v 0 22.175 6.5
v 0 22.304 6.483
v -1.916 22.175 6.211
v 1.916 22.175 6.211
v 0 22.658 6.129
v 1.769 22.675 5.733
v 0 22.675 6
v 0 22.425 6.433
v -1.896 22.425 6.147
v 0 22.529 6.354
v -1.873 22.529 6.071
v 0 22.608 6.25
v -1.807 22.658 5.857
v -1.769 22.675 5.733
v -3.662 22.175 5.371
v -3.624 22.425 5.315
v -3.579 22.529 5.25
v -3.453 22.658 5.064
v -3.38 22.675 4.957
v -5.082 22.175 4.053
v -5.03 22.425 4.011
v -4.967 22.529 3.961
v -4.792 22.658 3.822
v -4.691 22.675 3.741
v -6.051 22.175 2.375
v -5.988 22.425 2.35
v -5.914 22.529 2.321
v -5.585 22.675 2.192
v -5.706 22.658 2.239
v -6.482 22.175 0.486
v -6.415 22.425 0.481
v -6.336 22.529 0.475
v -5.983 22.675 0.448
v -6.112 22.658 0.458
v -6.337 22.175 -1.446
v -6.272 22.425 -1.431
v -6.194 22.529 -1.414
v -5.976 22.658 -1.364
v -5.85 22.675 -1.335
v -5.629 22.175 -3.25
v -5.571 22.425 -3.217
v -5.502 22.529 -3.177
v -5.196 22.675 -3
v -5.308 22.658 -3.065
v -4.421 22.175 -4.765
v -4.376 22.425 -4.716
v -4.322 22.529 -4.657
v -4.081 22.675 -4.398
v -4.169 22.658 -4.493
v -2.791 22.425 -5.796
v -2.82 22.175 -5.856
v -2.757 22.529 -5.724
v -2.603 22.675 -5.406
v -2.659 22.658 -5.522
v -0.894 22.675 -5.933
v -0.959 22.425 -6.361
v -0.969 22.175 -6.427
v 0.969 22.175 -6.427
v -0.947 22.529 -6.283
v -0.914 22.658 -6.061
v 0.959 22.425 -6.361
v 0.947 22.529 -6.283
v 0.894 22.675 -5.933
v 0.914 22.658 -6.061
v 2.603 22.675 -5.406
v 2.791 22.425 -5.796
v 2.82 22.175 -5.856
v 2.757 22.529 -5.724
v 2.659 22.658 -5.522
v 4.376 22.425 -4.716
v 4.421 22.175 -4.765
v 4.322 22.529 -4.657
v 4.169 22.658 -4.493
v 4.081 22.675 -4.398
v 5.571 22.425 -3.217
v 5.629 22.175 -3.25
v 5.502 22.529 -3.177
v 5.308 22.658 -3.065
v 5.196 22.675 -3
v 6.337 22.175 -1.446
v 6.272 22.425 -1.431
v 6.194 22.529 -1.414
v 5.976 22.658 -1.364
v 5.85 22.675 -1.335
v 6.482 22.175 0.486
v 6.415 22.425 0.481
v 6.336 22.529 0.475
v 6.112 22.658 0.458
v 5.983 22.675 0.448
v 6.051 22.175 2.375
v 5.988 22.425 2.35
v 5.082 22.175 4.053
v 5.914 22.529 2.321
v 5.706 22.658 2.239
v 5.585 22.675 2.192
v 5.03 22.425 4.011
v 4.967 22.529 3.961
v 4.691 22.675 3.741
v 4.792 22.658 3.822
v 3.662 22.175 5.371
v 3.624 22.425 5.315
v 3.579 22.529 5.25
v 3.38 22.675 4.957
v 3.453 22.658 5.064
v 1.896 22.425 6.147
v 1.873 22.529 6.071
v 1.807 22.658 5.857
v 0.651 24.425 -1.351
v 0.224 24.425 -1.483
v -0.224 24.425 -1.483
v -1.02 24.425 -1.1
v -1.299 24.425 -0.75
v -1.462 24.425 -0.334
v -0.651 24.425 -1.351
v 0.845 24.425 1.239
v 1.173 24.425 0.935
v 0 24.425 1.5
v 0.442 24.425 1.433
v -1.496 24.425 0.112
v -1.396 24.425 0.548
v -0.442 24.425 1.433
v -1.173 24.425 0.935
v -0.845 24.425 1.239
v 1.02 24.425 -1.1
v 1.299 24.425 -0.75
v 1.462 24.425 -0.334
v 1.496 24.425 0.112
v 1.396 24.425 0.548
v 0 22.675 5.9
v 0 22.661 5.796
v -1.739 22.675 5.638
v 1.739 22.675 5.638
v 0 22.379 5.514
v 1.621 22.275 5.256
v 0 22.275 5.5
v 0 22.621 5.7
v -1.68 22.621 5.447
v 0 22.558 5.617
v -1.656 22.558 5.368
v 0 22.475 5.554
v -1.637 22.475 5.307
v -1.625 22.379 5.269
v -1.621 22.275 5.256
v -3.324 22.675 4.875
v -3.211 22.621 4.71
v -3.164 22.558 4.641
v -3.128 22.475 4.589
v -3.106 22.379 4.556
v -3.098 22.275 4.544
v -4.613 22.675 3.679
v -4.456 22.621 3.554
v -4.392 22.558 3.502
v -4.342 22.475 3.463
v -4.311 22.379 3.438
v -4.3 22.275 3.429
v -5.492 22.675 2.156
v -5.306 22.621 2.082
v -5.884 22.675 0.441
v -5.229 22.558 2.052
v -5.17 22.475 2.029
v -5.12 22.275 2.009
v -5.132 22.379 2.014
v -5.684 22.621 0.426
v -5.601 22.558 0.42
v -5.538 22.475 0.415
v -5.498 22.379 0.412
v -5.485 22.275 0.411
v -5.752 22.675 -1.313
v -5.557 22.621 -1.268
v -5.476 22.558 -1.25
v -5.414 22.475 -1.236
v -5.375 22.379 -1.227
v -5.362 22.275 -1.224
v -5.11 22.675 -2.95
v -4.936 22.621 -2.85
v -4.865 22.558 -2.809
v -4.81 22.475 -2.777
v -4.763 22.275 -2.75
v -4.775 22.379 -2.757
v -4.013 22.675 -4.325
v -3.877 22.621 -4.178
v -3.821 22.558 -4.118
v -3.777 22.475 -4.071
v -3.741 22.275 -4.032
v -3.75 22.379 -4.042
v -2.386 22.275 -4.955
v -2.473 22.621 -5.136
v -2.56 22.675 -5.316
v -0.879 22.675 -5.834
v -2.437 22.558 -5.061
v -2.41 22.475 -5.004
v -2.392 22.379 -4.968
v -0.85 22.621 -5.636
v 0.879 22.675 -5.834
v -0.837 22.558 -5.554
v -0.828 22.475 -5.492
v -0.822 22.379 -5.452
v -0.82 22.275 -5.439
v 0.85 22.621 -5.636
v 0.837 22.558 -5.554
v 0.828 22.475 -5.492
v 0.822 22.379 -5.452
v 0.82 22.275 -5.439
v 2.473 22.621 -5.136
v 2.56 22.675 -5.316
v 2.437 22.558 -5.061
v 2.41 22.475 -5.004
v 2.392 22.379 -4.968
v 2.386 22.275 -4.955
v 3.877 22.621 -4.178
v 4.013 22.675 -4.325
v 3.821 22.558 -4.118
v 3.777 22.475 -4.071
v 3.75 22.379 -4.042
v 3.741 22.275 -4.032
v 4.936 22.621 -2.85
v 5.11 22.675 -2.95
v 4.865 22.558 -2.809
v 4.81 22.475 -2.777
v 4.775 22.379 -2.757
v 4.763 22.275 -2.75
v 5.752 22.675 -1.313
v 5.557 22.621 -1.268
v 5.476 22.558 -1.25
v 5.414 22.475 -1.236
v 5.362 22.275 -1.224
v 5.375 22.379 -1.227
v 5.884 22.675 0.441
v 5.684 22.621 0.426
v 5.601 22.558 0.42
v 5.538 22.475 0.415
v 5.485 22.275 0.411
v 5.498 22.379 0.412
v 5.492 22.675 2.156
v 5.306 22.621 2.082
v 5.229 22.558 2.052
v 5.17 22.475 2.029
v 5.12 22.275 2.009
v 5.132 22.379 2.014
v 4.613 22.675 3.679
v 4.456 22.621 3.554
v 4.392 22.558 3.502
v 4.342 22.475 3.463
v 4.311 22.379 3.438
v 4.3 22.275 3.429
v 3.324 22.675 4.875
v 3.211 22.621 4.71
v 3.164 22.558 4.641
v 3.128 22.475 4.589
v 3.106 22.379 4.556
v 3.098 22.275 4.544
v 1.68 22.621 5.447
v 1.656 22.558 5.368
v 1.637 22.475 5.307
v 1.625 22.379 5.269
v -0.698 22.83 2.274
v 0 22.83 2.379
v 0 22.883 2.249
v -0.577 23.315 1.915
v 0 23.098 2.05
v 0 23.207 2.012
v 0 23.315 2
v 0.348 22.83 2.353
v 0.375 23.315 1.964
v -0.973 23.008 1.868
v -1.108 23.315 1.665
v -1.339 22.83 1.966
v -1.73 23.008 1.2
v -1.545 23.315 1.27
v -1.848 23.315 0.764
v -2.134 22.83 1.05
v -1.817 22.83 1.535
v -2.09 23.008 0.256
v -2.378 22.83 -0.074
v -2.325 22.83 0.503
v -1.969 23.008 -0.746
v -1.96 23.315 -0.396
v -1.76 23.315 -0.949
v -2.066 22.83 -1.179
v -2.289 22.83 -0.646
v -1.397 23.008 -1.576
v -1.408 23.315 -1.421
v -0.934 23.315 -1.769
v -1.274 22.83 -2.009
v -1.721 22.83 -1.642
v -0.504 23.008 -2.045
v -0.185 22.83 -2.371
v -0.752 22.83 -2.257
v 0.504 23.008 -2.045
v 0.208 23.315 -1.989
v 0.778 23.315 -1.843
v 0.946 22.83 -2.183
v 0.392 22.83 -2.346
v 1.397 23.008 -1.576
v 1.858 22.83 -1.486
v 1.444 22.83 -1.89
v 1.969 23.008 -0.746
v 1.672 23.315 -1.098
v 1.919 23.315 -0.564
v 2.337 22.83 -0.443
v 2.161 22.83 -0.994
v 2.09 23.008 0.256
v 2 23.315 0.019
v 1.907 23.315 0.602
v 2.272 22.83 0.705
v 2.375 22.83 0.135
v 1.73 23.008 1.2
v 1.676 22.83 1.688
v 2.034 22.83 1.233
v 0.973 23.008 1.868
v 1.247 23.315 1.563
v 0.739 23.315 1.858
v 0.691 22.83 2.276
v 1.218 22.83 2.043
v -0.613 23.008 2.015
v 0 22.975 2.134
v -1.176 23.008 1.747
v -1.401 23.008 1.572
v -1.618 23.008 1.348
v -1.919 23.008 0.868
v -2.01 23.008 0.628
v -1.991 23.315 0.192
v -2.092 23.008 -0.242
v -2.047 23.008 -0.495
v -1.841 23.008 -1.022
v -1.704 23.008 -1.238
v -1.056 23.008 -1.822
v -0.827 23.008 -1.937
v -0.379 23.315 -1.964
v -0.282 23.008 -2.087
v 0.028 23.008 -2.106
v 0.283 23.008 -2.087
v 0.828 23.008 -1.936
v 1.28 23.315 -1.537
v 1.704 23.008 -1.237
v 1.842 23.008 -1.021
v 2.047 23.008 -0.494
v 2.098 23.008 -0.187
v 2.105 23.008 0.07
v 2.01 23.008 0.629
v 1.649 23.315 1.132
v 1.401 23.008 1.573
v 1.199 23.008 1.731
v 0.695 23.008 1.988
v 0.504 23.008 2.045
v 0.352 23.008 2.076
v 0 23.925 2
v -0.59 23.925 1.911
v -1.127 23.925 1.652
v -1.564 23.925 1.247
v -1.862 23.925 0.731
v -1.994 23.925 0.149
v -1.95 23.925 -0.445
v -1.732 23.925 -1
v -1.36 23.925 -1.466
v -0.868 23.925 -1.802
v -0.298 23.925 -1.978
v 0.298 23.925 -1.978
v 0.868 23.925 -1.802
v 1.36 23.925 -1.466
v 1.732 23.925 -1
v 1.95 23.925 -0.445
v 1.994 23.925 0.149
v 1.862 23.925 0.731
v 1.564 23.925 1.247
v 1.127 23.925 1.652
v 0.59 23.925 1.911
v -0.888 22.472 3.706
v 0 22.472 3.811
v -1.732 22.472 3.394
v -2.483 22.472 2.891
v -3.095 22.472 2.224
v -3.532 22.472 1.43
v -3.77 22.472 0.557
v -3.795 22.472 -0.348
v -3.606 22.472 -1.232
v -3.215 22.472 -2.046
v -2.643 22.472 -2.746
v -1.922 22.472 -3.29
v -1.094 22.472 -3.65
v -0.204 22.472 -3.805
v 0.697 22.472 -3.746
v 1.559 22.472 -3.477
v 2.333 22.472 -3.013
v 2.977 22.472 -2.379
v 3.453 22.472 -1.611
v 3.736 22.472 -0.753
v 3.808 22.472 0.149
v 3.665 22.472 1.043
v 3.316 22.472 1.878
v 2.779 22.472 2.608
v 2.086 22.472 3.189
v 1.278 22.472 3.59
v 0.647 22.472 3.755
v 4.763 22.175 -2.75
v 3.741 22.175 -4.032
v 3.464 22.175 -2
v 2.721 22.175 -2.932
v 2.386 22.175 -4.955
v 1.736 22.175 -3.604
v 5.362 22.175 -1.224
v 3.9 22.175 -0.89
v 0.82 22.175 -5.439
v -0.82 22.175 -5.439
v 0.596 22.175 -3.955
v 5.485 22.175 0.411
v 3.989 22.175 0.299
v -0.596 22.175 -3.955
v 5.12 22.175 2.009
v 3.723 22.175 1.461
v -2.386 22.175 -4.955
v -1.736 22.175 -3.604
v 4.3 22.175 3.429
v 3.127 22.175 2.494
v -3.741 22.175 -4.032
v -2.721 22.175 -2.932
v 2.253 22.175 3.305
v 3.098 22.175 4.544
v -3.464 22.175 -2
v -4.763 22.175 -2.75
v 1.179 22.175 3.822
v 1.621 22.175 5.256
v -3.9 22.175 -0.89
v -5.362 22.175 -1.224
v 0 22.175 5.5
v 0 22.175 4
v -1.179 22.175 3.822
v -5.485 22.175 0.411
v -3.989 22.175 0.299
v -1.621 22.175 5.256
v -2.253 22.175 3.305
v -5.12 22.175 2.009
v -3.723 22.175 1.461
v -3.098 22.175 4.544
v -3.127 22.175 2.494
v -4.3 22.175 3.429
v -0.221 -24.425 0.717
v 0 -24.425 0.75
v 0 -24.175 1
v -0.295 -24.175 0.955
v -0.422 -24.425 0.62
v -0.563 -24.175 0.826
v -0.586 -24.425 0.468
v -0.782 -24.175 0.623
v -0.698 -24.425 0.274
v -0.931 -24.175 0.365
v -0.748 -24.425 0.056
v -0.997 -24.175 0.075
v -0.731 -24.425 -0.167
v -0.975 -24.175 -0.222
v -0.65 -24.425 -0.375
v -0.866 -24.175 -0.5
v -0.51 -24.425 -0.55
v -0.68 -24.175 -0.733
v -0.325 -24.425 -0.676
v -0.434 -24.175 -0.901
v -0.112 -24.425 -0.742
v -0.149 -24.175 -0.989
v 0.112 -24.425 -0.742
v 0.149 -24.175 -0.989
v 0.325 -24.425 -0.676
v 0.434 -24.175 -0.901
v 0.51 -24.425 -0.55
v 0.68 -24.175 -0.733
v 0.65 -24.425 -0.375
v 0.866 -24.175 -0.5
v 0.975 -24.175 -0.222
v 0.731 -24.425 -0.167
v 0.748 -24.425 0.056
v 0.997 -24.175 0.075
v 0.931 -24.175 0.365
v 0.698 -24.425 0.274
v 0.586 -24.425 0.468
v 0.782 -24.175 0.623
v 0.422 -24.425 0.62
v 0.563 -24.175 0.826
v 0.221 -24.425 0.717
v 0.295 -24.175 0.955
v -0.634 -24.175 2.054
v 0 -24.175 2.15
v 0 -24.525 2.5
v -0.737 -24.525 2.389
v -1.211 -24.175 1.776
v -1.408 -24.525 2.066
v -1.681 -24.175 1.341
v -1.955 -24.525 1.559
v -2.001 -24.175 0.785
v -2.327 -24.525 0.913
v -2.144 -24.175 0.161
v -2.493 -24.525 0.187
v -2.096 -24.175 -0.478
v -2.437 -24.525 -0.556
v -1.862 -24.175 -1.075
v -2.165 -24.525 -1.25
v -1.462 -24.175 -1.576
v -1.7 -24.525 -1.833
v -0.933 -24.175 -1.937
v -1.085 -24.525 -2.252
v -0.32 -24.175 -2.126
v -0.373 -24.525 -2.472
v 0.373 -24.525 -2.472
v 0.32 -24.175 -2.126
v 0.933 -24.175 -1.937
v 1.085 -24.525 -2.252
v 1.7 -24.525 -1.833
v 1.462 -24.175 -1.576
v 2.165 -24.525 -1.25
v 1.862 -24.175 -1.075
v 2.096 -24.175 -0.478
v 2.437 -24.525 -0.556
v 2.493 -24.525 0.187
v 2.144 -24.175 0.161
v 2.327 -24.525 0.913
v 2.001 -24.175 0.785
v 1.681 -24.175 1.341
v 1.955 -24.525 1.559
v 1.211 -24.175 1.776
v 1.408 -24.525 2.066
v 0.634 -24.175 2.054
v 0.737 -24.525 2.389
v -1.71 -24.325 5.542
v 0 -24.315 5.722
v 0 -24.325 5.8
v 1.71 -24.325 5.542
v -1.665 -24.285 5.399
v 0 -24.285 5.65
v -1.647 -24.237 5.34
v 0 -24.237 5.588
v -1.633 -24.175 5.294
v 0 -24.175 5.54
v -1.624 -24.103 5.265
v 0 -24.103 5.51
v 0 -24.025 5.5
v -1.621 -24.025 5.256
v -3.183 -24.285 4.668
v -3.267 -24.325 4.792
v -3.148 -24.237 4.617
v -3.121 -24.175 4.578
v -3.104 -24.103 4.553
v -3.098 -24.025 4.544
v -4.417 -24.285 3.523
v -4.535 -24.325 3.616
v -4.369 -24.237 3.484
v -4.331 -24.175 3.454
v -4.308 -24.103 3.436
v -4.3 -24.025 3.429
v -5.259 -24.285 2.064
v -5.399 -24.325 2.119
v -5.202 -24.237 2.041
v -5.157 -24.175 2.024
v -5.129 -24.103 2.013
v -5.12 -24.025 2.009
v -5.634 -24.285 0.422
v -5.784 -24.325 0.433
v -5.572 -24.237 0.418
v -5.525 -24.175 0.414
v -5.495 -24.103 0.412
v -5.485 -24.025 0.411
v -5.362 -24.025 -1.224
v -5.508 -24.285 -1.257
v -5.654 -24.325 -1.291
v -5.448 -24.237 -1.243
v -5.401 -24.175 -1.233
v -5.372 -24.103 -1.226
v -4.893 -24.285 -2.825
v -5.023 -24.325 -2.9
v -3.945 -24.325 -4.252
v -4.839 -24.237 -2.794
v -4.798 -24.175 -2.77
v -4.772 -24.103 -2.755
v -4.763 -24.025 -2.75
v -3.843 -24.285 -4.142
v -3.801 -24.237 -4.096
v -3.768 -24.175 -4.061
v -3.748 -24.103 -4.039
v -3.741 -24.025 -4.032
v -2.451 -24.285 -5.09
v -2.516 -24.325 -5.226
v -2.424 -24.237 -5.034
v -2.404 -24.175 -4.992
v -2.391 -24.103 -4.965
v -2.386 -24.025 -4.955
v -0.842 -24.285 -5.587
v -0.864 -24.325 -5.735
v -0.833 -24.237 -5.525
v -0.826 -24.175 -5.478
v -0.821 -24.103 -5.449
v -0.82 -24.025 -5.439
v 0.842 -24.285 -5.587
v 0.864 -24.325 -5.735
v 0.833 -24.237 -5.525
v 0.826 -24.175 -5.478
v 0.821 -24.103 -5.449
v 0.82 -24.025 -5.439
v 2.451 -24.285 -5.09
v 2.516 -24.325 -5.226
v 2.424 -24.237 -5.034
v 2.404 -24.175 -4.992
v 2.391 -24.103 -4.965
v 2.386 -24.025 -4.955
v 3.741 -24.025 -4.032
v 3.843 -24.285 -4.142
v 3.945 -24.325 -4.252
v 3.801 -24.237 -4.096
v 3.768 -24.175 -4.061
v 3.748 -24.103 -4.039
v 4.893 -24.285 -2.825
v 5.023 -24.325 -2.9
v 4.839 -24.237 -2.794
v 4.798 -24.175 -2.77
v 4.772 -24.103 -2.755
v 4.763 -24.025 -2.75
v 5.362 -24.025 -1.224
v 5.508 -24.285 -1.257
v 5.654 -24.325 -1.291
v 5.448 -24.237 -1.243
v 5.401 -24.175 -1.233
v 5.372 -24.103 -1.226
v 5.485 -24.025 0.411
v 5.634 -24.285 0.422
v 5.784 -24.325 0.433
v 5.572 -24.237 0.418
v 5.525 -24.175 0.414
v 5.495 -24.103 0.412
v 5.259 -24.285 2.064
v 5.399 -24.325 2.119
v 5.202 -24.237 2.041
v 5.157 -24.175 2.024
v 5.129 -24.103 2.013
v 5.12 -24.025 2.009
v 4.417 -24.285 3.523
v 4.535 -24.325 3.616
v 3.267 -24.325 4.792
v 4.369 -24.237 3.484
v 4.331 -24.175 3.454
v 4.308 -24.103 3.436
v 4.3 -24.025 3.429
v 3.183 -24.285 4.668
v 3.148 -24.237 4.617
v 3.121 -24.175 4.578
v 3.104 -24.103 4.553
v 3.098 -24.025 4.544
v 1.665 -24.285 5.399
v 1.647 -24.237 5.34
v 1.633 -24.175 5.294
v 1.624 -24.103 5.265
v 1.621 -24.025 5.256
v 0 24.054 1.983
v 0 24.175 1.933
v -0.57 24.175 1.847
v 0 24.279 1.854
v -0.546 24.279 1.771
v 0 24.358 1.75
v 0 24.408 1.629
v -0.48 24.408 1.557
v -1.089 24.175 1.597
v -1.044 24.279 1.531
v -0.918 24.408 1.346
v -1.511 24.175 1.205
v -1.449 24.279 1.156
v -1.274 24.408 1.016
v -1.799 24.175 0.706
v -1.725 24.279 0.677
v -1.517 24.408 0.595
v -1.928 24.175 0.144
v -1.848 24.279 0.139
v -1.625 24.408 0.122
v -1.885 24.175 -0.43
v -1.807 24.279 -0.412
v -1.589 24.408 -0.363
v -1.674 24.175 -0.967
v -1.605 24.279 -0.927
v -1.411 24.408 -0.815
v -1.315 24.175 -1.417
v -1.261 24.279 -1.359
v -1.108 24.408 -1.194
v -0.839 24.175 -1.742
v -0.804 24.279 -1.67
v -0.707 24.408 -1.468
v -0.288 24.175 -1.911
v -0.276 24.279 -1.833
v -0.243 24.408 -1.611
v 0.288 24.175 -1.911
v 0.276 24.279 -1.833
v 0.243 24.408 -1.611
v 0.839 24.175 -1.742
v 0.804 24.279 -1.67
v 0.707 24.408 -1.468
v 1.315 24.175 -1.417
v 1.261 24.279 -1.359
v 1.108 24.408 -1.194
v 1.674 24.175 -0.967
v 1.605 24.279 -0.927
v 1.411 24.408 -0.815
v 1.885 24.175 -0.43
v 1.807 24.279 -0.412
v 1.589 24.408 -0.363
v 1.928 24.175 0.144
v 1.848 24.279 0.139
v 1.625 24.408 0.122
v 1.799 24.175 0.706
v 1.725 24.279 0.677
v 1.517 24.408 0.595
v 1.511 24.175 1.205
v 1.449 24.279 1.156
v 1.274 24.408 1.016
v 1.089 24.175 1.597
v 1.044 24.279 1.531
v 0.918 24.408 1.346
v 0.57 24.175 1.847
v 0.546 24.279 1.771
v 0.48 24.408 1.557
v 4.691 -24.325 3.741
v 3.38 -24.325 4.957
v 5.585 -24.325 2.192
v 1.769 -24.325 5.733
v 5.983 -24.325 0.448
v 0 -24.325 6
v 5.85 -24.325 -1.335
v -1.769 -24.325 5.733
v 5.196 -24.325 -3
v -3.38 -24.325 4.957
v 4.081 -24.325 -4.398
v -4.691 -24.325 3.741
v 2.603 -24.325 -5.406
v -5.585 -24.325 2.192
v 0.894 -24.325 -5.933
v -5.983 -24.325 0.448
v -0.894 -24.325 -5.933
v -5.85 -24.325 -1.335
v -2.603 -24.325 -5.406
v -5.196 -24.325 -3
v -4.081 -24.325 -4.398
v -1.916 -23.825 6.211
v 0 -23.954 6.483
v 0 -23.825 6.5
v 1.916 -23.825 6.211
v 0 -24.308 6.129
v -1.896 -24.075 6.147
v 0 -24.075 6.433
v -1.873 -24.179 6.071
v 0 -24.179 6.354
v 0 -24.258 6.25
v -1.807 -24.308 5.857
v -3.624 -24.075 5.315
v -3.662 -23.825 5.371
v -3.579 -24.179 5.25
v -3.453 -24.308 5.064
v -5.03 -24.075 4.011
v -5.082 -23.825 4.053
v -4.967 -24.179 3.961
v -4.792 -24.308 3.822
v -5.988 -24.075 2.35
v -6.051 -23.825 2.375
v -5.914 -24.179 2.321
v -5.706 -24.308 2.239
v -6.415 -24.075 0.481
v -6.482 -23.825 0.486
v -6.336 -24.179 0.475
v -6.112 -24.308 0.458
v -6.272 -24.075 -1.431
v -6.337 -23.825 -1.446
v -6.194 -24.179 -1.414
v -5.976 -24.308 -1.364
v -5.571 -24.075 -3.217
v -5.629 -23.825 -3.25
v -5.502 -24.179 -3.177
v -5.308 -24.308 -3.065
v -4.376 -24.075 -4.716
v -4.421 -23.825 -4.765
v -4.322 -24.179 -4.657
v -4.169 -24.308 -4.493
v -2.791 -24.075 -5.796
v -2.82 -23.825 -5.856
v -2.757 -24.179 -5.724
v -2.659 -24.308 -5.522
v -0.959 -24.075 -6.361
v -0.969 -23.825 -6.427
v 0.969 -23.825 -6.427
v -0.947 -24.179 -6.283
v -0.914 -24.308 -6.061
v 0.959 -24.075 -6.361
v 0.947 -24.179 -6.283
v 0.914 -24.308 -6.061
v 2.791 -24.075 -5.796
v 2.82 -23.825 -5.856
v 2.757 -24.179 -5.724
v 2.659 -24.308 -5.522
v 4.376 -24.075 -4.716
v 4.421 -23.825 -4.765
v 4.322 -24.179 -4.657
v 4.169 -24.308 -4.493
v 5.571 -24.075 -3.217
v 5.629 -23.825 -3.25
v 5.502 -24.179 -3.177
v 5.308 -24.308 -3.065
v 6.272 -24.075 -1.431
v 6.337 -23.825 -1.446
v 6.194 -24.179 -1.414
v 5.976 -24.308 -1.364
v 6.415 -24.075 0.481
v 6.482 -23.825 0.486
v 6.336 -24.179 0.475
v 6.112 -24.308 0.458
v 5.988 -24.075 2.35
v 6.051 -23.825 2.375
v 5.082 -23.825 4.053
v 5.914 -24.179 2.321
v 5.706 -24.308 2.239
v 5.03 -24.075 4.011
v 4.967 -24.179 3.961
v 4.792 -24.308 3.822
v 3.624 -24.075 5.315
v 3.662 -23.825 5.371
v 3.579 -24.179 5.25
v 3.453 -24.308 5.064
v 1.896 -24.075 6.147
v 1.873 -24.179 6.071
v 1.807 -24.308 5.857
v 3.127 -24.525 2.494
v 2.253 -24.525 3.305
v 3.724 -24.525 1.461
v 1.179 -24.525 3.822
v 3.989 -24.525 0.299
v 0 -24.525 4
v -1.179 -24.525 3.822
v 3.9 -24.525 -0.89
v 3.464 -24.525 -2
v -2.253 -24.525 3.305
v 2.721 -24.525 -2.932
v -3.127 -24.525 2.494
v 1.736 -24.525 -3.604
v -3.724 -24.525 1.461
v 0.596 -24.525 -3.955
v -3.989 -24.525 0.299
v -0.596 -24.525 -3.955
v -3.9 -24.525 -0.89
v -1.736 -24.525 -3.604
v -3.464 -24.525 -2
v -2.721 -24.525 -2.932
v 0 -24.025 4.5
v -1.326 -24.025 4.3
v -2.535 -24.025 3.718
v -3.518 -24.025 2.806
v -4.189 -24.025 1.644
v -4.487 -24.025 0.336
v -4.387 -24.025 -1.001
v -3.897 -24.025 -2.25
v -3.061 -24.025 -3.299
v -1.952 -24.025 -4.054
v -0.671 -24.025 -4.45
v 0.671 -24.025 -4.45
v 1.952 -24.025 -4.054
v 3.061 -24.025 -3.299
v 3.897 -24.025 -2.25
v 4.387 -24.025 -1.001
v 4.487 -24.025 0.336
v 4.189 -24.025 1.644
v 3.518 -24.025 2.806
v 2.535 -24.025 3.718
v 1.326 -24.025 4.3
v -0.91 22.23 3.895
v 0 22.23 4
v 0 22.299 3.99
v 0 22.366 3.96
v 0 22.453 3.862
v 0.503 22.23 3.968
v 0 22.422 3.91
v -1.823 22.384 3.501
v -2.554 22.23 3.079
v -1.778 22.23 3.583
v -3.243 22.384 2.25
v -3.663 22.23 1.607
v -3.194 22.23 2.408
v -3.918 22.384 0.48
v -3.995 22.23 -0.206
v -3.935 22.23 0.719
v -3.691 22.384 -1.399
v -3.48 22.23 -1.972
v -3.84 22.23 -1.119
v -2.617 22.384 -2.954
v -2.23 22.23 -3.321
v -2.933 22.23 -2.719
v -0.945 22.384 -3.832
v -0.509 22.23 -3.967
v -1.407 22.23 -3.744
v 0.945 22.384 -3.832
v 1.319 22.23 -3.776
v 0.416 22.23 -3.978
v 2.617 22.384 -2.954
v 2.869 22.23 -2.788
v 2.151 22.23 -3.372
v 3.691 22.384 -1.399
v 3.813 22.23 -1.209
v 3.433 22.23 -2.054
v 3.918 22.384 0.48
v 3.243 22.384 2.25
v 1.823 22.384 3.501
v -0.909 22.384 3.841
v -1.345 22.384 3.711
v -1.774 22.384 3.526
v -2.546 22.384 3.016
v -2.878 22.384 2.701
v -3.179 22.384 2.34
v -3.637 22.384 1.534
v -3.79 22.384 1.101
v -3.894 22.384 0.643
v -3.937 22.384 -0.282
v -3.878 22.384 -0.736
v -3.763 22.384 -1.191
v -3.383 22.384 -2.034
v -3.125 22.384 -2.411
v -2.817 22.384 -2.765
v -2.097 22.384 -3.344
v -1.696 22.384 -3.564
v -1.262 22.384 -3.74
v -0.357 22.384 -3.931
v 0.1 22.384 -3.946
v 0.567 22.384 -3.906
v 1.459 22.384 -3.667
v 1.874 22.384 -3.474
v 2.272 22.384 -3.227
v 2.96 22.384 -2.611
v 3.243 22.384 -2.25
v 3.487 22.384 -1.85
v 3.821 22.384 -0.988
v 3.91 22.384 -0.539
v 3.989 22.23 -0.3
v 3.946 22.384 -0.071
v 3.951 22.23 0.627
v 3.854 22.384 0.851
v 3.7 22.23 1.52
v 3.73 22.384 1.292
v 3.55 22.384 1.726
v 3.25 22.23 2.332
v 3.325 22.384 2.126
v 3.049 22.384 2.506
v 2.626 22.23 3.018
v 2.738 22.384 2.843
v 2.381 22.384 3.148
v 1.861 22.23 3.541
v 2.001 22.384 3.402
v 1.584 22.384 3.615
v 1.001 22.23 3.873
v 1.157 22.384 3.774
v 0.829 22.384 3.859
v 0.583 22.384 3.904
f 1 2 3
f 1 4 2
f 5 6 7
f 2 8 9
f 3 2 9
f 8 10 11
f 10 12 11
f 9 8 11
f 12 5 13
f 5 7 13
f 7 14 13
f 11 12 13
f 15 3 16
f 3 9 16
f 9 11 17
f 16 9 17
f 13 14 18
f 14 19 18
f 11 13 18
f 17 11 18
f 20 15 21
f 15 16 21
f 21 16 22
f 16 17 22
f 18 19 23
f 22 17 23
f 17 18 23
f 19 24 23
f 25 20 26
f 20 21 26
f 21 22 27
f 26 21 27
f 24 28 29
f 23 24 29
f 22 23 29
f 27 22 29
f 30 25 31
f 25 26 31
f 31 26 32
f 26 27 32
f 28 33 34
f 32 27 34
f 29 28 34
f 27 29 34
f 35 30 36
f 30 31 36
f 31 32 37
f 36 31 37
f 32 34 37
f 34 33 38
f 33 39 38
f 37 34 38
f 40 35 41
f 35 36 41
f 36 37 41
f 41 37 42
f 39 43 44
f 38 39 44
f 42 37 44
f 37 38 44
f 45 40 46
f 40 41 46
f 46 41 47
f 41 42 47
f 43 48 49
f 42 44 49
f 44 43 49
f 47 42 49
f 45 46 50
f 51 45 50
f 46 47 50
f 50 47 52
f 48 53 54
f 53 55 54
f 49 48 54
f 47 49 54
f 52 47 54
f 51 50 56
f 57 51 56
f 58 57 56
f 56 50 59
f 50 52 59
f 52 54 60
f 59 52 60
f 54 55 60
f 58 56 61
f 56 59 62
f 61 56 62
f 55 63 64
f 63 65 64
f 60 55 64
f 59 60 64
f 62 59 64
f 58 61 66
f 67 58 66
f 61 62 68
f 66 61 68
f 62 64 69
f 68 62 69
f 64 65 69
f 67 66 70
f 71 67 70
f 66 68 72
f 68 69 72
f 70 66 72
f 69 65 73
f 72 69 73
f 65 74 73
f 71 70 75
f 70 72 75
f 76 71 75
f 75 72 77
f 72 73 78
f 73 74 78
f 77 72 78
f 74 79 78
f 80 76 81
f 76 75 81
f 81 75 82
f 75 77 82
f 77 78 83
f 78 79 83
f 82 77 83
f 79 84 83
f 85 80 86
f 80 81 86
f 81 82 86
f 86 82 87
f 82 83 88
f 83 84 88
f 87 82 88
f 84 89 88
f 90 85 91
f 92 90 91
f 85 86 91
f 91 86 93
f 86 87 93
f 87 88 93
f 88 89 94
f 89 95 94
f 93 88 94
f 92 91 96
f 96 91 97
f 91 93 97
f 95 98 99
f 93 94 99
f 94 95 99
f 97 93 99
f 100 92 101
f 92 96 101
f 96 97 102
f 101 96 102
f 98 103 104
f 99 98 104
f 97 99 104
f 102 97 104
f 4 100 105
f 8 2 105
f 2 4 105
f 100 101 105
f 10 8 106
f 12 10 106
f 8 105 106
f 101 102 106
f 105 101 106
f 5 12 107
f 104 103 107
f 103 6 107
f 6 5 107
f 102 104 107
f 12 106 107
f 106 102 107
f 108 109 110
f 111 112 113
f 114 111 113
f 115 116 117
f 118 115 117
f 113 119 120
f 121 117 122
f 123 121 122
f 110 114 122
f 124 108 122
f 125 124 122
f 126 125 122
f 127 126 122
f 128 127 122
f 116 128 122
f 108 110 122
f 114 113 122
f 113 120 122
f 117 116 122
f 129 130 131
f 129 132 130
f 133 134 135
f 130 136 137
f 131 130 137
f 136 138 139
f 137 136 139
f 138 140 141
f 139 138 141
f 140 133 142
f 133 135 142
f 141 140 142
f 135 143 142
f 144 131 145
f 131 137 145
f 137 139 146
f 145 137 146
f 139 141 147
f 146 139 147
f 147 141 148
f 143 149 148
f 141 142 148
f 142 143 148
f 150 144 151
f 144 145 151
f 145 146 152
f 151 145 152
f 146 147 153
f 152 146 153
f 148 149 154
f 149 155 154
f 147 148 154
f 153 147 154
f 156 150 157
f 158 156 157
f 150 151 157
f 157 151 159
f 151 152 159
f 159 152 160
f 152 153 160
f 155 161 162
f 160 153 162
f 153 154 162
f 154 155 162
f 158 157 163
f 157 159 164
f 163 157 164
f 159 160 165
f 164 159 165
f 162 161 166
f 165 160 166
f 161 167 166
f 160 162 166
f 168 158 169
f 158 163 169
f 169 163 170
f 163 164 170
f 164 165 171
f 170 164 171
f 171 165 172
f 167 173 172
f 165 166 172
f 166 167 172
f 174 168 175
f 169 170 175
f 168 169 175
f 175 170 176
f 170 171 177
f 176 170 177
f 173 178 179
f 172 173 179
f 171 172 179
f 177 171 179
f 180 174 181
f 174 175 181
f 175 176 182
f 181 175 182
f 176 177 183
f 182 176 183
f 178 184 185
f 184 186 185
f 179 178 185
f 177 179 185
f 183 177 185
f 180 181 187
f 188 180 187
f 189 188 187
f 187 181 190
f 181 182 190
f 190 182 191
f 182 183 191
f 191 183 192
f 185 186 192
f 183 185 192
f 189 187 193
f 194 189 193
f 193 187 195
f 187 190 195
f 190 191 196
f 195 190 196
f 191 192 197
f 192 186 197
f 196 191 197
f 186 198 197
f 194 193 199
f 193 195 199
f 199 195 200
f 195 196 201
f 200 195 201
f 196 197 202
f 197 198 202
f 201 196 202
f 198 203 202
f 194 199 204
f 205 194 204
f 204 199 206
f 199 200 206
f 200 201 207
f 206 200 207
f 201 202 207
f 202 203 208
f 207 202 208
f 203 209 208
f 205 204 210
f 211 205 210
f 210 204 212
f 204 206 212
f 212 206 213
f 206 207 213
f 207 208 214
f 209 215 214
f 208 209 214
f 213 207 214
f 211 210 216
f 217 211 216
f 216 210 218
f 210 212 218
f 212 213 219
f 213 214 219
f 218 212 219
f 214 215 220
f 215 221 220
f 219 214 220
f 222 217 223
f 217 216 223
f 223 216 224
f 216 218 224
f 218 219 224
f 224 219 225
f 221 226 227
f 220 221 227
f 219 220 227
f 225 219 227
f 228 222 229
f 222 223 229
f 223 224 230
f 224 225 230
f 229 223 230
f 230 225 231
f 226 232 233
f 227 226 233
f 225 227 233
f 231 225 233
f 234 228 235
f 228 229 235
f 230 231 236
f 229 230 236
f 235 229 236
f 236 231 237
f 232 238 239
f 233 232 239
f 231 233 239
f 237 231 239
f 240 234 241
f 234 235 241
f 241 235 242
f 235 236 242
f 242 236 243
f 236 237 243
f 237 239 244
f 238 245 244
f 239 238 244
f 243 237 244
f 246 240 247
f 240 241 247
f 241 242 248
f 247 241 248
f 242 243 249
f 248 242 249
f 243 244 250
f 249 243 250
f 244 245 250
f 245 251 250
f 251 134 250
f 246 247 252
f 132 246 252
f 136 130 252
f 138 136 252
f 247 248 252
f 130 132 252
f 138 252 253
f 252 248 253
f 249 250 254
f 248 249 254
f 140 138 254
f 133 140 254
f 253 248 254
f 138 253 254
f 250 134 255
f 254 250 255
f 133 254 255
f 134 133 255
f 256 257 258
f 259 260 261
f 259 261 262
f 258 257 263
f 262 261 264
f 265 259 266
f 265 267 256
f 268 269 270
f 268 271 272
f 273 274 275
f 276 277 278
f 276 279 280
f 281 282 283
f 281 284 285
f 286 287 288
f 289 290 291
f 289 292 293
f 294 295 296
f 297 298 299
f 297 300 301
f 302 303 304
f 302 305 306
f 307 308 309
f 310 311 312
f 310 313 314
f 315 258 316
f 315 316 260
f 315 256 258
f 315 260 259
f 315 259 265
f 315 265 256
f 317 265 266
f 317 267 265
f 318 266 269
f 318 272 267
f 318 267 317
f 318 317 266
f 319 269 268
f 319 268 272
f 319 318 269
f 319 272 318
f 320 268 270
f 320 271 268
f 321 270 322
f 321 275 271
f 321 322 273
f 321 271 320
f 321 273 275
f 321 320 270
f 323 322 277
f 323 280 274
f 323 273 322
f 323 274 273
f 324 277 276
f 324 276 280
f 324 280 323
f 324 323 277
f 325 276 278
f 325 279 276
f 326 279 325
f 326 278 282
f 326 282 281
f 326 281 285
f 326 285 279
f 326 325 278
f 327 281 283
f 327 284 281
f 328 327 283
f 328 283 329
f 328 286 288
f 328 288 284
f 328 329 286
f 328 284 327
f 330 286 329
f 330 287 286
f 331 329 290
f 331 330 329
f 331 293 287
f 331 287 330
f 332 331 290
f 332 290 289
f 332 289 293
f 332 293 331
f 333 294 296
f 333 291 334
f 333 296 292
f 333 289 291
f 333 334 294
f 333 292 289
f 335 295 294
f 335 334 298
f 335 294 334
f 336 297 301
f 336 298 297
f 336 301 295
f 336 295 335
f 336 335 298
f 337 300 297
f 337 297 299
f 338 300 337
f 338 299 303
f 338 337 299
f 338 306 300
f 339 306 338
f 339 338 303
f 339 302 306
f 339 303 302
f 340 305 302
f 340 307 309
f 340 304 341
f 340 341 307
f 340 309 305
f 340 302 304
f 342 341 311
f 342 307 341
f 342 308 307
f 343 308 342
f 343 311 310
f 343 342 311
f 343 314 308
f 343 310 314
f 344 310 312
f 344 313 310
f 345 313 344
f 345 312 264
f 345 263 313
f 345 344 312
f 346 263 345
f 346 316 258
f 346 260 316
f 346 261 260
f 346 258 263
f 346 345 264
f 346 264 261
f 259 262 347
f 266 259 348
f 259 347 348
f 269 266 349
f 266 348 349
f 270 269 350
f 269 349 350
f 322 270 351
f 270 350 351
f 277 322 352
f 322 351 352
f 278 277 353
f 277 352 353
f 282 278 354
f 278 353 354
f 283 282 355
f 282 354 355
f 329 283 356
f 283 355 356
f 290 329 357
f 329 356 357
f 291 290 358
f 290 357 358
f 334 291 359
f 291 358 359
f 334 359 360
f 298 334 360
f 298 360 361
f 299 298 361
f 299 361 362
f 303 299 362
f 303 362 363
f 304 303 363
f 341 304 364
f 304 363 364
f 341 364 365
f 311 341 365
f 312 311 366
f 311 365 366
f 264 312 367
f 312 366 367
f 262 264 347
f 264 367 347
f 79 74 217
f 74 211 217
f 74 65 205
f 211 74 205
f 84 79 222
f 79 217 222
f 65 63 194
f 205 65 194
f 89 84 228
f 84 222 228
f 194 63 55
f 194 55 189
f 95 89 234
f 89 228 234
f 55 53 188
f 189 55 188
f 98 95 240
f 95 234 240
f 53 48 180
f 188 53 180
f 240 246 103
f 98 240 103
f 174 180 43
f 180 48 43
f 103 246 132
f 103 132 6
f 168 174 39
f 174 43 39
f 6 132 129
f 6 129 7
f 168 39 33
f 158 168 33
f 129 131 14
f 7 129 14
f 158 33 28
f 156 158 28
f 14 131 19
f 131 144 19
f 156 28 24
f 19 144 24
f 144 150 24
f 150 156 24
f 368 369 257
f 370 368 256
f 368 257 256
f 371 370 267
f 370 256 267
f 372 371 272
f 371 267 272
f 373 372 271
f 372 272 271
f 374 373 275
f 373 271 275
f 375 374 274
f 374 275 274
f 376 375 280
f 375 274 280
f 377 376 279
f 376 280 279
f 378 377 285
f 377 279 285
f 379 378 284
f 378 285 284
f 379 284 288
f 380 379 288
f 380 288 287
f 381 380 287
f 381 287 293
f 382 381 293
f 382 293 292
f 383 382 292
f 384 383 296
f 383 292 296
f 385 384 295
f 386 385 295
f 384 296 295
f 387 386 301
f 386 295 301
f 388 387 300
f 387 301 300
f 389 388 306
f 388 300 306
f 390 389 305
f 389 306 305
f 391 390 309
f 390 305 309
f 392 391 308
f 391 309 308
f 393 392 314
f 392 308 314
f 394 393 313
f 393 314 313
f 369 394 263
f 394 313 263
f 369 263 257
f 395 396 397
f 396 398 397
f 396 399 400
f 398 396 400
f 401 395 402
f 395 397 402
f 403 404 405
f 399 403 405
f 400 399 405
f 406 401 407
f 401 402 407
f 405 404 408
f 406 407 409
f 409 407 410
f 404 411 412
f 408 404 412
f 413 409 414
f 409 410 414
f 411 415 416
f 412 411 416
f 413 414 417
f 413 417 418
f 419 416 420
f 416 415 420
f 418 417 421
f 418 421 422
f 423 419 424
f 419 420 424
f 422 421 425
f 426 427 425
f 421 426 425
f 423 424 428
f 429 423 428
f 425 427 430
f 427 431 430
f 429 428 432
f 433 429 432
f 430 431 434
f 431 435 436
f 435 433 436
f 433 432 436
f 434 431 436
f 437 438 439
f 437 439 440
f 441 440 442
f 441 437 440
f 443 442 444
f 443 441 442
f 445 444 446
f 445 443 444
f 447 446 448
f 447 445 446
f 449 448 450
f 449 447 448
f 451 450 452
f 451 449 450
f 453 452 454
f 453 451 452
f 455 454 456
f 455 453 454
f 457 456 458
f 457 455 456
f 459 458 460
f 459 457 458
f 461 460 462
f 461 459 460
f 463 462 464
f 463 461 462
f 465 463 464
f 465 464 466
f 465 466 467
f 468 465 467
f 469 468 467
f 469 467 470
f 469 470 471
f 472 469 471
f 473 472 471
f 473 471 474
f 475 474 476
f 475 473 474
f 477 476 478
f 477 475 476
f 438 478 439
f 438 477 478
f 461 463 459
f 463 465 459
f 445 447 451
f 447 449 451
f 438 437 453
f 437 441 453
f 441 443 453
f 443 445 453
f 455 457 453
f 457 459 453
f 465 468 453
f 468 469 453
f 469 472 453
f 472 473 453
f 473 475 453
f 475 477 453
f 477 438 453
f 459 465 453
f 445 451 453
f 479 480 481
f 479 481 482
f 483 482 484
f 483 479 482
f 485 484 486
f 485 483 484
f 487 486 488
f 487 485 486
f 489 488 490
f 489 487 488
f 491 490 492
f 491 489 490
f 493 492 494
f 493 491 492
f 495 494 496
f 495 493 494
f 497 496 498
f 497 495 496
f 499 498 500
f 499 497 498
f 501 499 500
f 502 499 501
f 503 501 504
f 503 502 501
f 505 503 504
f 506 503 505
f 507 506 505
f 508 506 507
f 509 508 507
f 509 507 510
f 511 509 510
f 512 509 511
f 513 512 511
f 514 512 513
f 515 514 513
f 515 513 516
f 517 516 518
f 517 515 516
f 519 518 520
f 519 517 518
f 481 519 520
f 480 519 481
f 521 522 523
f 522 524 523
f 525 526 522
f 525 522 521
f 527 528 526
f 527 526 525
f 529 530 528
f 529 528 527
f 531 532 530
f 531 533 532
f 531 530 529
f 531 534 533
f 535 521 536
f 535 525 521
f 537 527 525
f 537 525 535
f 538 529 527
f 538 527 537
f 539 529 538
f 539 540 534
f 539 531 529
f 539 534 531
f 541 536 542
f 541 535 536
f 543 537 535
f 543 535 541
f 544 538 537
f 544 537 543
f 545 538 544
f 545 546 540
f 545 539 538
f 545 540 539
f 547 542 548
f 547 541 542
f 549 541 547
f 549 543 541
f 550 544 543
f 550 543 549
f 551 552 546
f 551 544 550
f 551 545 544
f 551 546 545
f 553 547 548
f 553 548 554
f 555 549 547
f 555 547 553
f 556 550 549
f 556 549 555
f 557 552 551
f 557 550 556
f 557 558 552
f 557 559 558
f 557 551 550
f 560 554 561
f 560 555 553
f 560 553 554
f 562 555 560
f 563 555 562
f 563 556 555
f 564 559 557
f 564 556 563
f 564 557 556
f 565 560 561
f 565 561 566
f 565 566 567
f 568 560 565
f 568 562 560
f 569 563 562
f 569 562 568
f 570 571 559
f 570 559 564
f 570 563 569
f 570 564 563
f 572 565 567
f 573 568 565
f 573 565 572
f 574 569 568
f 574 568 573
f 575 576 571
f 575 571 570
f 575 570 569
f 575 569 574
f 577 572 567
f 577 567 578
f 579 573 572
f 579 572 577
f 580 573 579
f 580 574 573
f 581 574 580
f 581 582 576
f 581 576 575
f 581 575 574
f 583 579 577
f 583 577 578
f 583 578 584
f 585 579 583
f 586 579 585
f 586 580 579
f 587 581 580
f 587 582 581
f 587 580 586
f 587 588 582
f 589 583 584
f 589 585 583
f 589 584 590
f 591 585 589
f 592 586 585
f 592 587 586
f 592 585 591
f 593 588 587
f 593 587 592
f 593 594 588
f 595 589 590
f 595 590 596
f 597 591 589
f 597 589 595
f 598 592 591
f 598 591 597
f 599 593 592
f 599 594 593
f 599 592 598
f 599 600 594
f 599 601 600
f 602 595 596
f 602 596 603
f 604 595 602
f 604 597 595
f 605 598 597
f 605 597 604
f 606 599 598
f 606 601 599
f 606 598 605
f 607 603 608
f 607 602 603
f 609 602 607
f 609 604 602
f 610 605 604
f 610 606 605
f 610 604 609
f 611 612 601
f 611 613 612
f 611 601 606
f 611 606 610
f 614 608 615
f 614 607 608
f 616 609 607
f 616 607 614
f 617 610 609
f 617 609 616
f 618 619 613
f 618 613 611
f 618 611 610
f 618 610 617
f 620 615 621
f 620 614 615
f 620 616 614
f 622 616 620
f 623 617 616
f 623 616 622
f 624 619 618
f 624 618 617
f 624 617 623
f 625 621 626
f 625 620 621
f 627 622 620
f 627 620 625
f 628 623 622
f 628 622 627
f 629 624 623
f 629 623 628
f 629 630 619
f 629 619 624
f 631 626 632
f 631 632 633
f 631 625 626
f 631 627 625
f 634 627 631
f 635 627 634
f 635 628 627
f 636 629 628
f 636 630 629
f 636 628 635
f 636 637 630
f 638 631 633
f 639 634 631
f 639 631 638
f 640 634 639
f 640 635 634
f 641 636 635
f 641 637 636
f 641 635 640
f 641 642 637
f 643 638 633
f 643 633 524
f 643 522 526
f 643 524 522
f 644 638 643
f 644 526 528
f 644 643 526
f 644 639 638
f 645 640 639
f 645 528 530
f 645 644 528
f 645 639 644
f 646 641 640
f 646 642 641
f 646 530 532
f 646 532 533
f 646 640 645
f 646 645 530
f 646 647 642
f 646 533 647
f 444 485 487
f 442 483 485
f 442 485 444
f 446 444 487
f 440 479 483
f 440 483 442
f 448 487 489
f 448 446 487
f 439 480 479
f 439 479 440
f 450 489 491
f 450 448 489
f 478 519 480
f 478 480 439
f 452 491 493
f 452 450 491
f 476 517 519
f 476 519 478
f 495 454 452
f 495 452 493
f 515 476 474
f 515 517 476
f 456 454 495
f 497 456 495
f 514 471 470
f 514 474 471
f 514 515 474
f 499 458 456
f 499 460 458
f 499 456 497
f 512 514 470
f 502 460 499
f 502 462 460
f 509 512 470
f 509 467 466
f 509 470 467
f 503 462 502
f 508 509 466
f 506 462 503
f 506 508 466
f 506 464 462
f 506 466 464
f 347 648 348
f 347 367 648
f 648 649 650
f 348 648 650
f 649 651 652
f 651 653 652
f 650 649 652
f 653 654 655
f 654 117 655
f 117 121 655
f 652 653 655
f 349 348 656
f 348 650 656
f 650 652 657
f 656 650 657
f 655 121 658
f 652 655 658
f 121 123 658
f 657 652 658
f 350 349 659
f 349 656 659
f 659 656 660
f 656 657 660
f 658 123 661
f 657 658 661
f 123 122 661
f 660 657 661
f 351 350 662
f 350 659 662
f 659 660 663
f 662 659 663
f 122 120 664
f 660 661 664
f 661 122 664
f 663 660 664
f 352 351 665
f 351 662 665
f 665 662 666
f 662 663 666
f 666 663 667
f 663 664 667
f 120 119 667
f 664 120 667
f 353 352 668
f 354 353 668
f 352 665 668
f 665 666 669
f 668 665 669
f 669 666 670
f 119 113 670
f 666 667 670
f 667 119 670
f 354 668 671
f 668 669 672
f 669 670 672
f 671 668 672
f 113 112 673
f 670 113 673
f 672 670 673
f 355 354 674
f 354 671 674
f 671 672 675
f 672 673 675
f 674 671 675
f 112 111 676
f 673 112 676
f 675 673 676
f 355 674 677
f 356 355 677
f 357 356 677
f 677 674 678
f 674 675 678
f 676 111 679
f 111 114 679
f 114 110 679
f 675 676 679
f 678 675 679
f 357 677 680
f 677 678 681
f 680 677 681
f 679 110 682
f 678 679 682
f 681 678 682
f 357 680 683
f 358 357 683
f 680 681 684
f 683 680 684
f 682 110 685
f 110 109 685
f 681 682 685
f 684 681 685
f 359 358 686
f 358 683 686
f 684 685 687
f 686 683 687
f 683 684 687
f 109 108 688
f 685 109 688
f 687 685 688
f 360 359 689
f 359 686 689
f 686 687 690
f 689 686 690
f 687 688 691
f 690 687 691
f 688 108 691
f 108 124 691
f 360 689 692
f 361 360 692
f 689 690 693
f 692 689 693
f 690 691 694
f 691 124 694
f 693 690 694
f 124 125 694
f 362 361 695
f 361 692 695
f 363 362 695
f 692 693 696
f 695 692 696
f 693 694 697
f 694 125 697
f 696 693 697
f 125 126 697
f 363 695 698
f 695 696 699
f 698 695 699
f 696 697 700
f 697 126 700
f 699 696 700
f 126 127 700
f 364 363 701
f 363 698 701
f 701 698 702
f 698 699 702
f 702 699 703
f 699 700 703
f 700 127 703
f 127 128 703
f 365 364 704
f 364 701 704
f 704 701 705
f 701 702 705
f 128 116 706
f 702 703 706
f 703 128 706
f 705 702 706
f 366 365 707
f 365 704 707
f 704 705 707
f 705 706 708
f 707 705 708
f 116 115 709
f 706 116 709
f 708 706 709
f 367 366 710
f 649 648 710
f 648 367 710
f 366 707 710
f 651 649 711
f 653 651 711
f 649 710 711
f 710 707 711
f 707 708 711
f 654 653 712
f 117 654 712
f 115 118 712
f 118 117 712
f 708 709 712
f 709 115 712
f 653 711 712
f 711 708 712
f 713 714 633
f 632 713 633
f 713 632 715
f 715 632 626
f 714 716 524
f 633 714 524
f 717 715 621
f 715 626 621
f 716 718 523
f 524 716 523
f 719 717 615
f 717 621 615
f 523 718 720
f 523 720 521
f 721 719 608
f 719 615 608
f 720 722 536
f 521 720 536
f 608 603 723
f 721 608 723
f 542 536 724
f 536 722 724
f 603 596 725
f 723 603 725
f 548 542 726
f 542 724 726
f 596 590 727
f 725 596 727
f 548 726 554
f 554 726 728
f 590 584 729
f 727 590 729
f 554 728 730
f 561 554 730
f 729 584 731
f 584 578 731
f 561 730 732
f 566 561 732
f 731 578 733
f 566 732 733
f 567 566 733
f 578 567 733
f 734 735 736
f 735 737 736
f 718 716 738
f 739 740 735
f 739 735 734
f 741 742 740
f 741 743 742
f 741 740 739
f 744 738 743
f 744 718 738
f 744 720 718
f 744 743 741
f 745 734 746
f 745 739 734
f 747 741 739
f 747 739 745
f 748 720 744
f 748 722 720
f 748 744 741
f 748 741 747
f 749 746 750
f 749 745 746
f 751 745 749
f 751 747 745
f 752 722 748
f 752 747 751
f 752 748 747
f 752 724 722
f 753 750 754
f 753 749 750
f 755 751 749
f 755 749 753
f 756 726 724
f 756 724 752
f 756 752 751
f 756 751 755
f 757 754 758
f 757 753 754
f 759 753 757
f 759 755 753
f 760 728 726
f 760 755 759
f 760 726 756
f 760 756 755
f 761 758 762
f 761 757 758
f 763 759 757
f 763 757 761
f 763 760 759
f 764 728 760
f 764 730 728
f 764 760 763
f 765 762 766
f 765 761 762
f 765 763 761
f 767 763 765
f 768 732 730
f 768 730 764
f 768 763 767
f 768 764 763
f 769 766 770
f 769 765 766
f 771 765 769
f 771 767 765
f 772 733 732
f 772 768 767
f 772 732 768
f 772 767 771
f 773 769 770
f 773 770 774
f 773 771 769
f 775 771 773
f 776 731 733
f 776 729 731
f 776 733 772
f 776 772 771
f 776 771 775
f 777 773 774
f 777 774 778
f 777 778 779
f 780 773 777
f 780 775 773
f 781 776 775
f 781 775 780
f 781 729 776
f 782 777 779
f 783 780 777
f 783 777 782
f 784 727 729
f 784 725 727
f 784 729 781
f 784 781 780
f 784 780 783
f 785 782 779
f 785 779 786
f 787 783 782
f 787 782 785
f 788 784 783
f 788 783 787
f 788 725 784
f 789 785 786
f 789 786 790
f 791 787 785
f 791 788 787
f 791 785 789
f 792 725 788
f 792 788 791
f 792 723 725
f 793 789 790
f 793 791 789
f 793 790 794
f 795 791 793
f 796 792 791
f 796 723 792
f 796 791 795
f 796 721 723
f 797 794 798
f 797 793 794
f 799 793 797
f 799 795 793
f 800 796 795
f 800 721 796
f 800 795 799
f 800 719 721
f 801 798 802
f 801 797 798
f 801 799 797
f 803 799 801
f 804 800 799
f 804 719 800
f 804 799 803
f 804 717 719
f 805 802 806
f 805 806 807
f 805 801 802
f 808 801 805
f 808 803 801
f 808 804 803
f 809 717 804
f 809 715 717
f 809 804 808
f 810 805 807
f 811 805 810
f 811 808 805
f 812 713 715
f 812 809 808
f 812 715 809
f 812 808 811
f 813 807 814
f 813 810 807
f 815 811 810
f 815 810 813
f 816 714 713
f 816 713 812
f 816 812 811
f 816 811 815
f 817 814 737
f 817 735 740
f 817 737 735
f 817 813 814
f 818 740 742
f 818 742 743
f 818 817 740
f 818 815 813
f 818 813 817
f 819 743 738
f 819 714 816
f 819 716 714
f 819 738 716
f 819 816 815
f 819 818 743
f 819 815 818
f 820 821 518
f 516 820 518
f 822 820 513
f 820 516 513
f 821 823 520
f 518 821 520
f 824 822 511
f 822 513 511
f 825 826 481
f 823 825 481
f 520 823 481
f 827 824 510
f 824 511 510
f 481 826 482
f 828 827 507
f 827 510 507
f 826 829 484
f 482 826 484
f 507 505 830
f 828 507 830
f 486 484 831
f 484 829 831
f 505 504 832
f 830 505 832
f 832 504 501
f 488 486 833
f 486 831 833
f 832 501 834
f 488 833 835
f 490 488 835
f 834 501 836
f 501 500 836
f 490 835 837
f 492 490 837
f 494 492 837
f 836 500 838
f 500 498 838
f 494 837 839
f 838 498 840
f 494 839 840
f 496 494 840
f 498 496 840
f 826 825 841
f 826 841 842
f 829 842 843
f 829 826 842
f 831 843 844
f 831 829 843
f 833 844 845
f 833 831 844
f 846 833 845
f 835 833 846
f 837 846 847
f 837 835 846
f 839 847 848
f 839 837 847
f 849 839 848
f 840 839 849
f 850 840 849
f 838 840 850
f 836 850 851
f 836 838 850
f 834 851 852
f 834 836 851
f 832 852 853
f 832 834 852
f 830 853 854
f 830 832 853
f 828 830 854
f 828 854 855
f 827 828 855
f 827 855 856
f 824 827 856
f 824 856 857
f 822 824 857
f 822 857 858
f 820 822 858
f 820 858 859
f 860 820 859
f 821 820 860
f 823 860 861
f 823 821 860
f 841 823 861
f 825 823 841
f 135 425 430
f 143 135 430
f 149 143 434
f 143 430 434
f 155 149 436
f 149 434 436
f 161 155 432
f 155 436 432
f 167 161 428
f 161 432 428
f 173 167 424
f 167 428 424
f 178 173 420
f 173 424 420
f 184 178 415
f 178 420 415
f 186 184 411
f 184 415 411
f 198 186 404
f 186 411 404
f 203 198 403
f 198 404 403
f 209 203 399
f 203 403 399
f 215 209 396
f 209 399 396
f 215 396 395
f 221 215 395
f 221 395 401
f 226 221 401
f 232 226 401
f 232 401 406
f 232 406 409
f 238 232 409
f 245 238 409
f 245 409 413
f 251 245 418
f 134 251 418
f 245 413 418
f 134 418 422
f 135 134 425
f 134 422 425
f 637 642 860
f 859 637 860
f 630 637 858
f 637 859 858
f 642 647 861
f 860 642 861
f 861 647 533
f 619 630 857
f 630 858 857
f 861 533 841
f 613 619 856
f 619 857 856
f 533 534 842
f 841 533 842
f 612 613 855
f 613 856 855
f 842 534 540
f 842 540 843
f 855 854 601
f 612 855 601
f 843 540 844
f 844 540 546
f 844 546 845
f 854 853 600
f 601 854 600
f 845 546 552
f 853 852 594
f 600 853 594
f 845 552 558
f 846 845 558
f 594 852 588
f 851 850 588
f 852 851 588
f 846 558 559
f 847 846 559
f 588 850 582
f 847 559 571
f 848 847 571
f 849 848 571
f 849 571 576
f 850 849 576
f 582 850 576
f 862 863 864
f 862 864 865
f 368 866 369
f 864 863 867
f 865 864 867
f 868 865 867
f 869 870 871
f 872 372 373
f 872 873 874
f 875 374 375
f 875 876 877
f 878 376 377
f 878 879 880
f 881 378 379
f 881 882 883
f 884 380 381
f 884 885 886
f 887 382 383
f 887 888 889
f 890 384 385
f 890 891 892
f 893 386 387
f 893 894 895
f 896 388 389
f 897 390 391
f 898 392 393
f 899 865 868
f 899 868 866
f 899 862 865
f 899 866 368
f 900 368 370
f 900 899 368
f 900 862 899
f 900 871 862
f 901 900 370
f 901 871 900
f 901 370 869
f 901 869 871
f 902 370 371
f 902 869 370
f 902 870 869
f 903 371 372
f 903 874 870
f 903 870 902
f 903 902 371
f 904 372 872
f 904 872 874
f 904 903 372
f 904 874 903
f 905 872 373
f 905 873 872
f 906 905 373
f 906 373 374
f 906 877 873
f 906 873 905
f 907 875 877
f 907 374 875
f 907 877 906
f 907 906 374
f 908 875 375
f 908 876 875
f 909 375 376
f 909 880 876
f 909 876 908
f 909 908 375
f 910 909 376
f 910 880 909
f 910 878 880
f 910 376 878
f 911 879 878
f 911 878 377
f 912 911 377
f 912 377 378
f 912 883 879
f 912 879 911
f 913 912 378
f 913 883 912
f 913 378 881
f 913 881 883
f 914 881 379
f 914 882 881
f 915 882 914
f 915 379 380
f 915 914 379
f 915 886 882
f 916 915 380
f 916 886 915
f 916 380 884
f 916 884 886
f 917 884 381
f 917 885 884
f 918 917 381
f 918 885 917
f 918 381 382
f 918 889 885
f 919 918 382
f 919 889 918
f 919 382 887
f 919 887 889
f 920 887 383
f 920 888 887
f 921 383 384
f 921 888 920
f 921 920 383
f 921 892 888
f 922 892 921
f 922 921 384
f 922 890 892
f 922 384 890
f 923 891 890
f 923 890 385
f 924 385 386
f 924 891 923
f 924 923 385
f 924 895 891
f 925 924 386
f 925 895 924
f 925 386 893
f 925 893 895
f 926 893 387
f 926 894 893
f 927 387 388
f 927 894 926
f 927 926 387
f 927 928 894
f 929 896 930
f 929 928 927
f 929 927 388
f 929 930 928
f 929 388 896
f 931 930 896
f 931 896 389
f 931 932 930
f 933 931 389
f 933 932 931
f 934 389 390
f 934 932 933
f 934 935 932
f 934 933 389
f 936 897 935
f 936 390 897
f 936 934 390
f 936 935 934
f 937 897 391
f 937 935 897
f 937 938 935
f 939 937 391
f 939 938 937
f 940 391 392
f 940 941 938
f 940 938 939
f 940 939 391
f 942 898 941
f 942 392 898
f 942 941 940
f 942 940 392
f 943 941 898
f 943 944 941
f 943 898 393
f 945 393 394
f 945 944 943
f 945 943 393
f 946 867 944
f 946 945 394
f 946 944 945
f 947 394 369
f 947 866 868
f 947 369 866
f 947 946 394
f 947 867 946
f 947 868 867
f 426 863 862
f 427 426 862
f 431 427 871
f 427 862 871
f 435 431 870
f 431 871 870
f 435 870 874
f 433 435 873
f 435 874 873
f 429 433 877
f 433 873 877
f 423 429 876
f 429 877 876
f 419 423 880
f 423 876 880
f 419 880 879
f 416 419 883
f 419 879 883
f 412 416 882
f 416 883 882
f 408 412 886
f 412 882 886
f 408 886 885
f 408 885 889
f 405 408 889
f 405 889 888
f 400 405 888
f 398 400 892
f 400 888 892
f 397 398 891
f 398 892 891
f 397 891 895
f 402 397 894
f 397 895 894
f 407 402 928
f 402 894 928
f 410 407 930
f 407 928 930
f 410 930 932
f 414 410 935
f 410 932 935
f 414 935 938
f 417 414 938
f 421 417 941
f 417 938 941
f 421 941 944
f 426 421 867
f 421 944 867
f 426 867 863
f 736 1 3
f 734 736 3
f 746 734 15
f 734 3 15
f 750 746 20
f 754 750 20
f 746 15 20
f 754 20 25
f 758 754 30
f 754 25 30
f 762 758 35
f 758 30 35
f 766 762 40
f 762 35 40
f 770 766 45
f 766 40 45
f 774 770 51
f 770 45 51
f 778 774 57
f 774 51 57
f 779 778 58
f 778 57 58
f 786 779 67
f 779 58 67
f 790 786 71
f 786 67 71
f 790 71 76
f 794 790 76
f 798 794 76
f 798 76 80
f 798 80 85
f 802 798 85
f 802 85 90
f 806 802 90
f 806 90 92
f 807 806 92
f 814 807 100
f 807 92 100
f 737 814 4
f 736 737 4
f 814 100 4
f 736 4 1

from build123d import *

# Parameters (mm, degrees)
FILLET1_R     = 0.5
FILLET2_R     = 0.4
FILLET3_R     = 0.25
FILLET4_R     = 0.5
FILLET5_R     = 0.5
FILLET6_R     = 0.5
FILLET7_R     = 0.3
CHAMFER1_SIZE = 0.5
CHAMFER2_SIZE = 1
CHAMFER3_SIZE = 0.25


# Some blends are built 0.0001 mm under size
with BuildPart() as part:
    # Sketch1 → Revolve1 (revolve)
    with BuildSketch(Plane.XY, mode=Mode.PRIVATE) as revolve1_sk:
        Polygon((0, -24.425), (0.75, -24.425), (0.75, -24.175), (1.5, -24.175), (1.5, -24.525), (4.5, -24.525), (4.5, -24.025), (5.5, -24.025), (5.5, -24.325), (6.5, -24.325), (6.5, 22.675), (5.5, 22.675), (5.5, 22.175), (4, 22.175), (4, 22.425), (2, 22.925), (2, 24.425), (0, 24.425), align=None)
    revolve(revolve1_sk.sketch.rotate(Axis((0, 54.317832455, 0), (0, -1, 0)), 90), axis=Axis((0, 54.317832455, 0), (0, -1, 0)))

    # Fillet1
    fillet1_edges = [part.edges().sort_by_distance(p)[0] for p in [
        (0, 22.675, -6.5),
    ]]
    fillet(fillet1_edges, radius=FILLET1_R)

    # Fillet2
    fillet2_edges = [part.edges().sort_by_distance(p)[0] for p in [
        (0, 22.675, -5.5),
    ]]
    fillet(fillet2_edges, radius=FILLET2_R)

    # Fillet3
    fillet3_edges = [part.edges().sort_by_distance(p)[0] for p in [
        (0, 22.425, -4),
    ]]
    fillet(fillet3_edges, radius=FILLET3_R)

    # Fillet4
    fillet4_edges = [part.edges().sort_by_distance(p)[0] for p in [
        (0, 22.925, -2),
    ]]
    fillet(fillet4_edges, radius=FILLET4_R)

    # Fillet5
    fillet5_edges = [part.edges().sort_by_distance(p)[0] for p in [
        (0, 24.425, -2),
    ]]
    fillet(fillet5_edges, radius=FILLET5_R)

    # Fillet6
    fillet6_edges = [part.edges().sort_by_distance(p)[0] for p in [
        (0, -24.325, -6.5),
    ]]
    fillet(fillet6_edges, radius=FILLET6_R)

    # Fillet7
    fillet7_edges = [part.edges().sort_by_distance(p)[0] for p in [
        (0, -24.325, -5.5),
    ]]
    fillet(fillet7_edges, radius=FILLET7_R - 0.0001)  # a hair under: the kernel refuses the full size

    # Chamfer1
    chamfer1_edges = [part.edges().sort_by_distance(p)[0] for p in [
        (0, -24.525, -4.5),
    ]]
    chamfer(chamfer1_edges, length=CHAMFER1_SIZE - 0.0001)  # a hair under: the kernel refuses the full size

    # Chamfer2
    # the kernel refuses this chamfer: 1 mm, written as the material it takes off along each edge
    with BuildSketch(Plane(origin=(0, -24.525, 0), x_dir=(0, 0, 1), z_dir=(1, 0, 0))) as chamfer2_piece_1_section:
        Polygon((1.5 + CHAMFER2_SIZE, 0), (1.5, -CHAMFER2_SIZE), (1.5, 0), align=None)
    chamfer2_piece_1 = revolve(axis=Axis((0, -24.525, 0), (0, -1, 0)), mode=Mode.PRIVATE)
    chamfer2_piece_1 = split(chamfer2_piece_1, bisect_by=Plane(origin=(0, -24.175, -2.328039708), z_dir=(0, -1, 0)), keep=Keep.TOP, mode=Mode.PRIVATE)
    add(chamfer2_piece_1, mode=Mode.SUBTRACT)

    # Chamfer3
    chamfer3_edges = [part.edges().sort_by_distance(p)[0] for p in [
        (0, -24.175, -0.75),
    ]]
    chamfer(chamfer3_edges, length=CHAMFER3_SIZE - 0.0001)  # a hair under: the kernel refuses the full size


solid = part.part
